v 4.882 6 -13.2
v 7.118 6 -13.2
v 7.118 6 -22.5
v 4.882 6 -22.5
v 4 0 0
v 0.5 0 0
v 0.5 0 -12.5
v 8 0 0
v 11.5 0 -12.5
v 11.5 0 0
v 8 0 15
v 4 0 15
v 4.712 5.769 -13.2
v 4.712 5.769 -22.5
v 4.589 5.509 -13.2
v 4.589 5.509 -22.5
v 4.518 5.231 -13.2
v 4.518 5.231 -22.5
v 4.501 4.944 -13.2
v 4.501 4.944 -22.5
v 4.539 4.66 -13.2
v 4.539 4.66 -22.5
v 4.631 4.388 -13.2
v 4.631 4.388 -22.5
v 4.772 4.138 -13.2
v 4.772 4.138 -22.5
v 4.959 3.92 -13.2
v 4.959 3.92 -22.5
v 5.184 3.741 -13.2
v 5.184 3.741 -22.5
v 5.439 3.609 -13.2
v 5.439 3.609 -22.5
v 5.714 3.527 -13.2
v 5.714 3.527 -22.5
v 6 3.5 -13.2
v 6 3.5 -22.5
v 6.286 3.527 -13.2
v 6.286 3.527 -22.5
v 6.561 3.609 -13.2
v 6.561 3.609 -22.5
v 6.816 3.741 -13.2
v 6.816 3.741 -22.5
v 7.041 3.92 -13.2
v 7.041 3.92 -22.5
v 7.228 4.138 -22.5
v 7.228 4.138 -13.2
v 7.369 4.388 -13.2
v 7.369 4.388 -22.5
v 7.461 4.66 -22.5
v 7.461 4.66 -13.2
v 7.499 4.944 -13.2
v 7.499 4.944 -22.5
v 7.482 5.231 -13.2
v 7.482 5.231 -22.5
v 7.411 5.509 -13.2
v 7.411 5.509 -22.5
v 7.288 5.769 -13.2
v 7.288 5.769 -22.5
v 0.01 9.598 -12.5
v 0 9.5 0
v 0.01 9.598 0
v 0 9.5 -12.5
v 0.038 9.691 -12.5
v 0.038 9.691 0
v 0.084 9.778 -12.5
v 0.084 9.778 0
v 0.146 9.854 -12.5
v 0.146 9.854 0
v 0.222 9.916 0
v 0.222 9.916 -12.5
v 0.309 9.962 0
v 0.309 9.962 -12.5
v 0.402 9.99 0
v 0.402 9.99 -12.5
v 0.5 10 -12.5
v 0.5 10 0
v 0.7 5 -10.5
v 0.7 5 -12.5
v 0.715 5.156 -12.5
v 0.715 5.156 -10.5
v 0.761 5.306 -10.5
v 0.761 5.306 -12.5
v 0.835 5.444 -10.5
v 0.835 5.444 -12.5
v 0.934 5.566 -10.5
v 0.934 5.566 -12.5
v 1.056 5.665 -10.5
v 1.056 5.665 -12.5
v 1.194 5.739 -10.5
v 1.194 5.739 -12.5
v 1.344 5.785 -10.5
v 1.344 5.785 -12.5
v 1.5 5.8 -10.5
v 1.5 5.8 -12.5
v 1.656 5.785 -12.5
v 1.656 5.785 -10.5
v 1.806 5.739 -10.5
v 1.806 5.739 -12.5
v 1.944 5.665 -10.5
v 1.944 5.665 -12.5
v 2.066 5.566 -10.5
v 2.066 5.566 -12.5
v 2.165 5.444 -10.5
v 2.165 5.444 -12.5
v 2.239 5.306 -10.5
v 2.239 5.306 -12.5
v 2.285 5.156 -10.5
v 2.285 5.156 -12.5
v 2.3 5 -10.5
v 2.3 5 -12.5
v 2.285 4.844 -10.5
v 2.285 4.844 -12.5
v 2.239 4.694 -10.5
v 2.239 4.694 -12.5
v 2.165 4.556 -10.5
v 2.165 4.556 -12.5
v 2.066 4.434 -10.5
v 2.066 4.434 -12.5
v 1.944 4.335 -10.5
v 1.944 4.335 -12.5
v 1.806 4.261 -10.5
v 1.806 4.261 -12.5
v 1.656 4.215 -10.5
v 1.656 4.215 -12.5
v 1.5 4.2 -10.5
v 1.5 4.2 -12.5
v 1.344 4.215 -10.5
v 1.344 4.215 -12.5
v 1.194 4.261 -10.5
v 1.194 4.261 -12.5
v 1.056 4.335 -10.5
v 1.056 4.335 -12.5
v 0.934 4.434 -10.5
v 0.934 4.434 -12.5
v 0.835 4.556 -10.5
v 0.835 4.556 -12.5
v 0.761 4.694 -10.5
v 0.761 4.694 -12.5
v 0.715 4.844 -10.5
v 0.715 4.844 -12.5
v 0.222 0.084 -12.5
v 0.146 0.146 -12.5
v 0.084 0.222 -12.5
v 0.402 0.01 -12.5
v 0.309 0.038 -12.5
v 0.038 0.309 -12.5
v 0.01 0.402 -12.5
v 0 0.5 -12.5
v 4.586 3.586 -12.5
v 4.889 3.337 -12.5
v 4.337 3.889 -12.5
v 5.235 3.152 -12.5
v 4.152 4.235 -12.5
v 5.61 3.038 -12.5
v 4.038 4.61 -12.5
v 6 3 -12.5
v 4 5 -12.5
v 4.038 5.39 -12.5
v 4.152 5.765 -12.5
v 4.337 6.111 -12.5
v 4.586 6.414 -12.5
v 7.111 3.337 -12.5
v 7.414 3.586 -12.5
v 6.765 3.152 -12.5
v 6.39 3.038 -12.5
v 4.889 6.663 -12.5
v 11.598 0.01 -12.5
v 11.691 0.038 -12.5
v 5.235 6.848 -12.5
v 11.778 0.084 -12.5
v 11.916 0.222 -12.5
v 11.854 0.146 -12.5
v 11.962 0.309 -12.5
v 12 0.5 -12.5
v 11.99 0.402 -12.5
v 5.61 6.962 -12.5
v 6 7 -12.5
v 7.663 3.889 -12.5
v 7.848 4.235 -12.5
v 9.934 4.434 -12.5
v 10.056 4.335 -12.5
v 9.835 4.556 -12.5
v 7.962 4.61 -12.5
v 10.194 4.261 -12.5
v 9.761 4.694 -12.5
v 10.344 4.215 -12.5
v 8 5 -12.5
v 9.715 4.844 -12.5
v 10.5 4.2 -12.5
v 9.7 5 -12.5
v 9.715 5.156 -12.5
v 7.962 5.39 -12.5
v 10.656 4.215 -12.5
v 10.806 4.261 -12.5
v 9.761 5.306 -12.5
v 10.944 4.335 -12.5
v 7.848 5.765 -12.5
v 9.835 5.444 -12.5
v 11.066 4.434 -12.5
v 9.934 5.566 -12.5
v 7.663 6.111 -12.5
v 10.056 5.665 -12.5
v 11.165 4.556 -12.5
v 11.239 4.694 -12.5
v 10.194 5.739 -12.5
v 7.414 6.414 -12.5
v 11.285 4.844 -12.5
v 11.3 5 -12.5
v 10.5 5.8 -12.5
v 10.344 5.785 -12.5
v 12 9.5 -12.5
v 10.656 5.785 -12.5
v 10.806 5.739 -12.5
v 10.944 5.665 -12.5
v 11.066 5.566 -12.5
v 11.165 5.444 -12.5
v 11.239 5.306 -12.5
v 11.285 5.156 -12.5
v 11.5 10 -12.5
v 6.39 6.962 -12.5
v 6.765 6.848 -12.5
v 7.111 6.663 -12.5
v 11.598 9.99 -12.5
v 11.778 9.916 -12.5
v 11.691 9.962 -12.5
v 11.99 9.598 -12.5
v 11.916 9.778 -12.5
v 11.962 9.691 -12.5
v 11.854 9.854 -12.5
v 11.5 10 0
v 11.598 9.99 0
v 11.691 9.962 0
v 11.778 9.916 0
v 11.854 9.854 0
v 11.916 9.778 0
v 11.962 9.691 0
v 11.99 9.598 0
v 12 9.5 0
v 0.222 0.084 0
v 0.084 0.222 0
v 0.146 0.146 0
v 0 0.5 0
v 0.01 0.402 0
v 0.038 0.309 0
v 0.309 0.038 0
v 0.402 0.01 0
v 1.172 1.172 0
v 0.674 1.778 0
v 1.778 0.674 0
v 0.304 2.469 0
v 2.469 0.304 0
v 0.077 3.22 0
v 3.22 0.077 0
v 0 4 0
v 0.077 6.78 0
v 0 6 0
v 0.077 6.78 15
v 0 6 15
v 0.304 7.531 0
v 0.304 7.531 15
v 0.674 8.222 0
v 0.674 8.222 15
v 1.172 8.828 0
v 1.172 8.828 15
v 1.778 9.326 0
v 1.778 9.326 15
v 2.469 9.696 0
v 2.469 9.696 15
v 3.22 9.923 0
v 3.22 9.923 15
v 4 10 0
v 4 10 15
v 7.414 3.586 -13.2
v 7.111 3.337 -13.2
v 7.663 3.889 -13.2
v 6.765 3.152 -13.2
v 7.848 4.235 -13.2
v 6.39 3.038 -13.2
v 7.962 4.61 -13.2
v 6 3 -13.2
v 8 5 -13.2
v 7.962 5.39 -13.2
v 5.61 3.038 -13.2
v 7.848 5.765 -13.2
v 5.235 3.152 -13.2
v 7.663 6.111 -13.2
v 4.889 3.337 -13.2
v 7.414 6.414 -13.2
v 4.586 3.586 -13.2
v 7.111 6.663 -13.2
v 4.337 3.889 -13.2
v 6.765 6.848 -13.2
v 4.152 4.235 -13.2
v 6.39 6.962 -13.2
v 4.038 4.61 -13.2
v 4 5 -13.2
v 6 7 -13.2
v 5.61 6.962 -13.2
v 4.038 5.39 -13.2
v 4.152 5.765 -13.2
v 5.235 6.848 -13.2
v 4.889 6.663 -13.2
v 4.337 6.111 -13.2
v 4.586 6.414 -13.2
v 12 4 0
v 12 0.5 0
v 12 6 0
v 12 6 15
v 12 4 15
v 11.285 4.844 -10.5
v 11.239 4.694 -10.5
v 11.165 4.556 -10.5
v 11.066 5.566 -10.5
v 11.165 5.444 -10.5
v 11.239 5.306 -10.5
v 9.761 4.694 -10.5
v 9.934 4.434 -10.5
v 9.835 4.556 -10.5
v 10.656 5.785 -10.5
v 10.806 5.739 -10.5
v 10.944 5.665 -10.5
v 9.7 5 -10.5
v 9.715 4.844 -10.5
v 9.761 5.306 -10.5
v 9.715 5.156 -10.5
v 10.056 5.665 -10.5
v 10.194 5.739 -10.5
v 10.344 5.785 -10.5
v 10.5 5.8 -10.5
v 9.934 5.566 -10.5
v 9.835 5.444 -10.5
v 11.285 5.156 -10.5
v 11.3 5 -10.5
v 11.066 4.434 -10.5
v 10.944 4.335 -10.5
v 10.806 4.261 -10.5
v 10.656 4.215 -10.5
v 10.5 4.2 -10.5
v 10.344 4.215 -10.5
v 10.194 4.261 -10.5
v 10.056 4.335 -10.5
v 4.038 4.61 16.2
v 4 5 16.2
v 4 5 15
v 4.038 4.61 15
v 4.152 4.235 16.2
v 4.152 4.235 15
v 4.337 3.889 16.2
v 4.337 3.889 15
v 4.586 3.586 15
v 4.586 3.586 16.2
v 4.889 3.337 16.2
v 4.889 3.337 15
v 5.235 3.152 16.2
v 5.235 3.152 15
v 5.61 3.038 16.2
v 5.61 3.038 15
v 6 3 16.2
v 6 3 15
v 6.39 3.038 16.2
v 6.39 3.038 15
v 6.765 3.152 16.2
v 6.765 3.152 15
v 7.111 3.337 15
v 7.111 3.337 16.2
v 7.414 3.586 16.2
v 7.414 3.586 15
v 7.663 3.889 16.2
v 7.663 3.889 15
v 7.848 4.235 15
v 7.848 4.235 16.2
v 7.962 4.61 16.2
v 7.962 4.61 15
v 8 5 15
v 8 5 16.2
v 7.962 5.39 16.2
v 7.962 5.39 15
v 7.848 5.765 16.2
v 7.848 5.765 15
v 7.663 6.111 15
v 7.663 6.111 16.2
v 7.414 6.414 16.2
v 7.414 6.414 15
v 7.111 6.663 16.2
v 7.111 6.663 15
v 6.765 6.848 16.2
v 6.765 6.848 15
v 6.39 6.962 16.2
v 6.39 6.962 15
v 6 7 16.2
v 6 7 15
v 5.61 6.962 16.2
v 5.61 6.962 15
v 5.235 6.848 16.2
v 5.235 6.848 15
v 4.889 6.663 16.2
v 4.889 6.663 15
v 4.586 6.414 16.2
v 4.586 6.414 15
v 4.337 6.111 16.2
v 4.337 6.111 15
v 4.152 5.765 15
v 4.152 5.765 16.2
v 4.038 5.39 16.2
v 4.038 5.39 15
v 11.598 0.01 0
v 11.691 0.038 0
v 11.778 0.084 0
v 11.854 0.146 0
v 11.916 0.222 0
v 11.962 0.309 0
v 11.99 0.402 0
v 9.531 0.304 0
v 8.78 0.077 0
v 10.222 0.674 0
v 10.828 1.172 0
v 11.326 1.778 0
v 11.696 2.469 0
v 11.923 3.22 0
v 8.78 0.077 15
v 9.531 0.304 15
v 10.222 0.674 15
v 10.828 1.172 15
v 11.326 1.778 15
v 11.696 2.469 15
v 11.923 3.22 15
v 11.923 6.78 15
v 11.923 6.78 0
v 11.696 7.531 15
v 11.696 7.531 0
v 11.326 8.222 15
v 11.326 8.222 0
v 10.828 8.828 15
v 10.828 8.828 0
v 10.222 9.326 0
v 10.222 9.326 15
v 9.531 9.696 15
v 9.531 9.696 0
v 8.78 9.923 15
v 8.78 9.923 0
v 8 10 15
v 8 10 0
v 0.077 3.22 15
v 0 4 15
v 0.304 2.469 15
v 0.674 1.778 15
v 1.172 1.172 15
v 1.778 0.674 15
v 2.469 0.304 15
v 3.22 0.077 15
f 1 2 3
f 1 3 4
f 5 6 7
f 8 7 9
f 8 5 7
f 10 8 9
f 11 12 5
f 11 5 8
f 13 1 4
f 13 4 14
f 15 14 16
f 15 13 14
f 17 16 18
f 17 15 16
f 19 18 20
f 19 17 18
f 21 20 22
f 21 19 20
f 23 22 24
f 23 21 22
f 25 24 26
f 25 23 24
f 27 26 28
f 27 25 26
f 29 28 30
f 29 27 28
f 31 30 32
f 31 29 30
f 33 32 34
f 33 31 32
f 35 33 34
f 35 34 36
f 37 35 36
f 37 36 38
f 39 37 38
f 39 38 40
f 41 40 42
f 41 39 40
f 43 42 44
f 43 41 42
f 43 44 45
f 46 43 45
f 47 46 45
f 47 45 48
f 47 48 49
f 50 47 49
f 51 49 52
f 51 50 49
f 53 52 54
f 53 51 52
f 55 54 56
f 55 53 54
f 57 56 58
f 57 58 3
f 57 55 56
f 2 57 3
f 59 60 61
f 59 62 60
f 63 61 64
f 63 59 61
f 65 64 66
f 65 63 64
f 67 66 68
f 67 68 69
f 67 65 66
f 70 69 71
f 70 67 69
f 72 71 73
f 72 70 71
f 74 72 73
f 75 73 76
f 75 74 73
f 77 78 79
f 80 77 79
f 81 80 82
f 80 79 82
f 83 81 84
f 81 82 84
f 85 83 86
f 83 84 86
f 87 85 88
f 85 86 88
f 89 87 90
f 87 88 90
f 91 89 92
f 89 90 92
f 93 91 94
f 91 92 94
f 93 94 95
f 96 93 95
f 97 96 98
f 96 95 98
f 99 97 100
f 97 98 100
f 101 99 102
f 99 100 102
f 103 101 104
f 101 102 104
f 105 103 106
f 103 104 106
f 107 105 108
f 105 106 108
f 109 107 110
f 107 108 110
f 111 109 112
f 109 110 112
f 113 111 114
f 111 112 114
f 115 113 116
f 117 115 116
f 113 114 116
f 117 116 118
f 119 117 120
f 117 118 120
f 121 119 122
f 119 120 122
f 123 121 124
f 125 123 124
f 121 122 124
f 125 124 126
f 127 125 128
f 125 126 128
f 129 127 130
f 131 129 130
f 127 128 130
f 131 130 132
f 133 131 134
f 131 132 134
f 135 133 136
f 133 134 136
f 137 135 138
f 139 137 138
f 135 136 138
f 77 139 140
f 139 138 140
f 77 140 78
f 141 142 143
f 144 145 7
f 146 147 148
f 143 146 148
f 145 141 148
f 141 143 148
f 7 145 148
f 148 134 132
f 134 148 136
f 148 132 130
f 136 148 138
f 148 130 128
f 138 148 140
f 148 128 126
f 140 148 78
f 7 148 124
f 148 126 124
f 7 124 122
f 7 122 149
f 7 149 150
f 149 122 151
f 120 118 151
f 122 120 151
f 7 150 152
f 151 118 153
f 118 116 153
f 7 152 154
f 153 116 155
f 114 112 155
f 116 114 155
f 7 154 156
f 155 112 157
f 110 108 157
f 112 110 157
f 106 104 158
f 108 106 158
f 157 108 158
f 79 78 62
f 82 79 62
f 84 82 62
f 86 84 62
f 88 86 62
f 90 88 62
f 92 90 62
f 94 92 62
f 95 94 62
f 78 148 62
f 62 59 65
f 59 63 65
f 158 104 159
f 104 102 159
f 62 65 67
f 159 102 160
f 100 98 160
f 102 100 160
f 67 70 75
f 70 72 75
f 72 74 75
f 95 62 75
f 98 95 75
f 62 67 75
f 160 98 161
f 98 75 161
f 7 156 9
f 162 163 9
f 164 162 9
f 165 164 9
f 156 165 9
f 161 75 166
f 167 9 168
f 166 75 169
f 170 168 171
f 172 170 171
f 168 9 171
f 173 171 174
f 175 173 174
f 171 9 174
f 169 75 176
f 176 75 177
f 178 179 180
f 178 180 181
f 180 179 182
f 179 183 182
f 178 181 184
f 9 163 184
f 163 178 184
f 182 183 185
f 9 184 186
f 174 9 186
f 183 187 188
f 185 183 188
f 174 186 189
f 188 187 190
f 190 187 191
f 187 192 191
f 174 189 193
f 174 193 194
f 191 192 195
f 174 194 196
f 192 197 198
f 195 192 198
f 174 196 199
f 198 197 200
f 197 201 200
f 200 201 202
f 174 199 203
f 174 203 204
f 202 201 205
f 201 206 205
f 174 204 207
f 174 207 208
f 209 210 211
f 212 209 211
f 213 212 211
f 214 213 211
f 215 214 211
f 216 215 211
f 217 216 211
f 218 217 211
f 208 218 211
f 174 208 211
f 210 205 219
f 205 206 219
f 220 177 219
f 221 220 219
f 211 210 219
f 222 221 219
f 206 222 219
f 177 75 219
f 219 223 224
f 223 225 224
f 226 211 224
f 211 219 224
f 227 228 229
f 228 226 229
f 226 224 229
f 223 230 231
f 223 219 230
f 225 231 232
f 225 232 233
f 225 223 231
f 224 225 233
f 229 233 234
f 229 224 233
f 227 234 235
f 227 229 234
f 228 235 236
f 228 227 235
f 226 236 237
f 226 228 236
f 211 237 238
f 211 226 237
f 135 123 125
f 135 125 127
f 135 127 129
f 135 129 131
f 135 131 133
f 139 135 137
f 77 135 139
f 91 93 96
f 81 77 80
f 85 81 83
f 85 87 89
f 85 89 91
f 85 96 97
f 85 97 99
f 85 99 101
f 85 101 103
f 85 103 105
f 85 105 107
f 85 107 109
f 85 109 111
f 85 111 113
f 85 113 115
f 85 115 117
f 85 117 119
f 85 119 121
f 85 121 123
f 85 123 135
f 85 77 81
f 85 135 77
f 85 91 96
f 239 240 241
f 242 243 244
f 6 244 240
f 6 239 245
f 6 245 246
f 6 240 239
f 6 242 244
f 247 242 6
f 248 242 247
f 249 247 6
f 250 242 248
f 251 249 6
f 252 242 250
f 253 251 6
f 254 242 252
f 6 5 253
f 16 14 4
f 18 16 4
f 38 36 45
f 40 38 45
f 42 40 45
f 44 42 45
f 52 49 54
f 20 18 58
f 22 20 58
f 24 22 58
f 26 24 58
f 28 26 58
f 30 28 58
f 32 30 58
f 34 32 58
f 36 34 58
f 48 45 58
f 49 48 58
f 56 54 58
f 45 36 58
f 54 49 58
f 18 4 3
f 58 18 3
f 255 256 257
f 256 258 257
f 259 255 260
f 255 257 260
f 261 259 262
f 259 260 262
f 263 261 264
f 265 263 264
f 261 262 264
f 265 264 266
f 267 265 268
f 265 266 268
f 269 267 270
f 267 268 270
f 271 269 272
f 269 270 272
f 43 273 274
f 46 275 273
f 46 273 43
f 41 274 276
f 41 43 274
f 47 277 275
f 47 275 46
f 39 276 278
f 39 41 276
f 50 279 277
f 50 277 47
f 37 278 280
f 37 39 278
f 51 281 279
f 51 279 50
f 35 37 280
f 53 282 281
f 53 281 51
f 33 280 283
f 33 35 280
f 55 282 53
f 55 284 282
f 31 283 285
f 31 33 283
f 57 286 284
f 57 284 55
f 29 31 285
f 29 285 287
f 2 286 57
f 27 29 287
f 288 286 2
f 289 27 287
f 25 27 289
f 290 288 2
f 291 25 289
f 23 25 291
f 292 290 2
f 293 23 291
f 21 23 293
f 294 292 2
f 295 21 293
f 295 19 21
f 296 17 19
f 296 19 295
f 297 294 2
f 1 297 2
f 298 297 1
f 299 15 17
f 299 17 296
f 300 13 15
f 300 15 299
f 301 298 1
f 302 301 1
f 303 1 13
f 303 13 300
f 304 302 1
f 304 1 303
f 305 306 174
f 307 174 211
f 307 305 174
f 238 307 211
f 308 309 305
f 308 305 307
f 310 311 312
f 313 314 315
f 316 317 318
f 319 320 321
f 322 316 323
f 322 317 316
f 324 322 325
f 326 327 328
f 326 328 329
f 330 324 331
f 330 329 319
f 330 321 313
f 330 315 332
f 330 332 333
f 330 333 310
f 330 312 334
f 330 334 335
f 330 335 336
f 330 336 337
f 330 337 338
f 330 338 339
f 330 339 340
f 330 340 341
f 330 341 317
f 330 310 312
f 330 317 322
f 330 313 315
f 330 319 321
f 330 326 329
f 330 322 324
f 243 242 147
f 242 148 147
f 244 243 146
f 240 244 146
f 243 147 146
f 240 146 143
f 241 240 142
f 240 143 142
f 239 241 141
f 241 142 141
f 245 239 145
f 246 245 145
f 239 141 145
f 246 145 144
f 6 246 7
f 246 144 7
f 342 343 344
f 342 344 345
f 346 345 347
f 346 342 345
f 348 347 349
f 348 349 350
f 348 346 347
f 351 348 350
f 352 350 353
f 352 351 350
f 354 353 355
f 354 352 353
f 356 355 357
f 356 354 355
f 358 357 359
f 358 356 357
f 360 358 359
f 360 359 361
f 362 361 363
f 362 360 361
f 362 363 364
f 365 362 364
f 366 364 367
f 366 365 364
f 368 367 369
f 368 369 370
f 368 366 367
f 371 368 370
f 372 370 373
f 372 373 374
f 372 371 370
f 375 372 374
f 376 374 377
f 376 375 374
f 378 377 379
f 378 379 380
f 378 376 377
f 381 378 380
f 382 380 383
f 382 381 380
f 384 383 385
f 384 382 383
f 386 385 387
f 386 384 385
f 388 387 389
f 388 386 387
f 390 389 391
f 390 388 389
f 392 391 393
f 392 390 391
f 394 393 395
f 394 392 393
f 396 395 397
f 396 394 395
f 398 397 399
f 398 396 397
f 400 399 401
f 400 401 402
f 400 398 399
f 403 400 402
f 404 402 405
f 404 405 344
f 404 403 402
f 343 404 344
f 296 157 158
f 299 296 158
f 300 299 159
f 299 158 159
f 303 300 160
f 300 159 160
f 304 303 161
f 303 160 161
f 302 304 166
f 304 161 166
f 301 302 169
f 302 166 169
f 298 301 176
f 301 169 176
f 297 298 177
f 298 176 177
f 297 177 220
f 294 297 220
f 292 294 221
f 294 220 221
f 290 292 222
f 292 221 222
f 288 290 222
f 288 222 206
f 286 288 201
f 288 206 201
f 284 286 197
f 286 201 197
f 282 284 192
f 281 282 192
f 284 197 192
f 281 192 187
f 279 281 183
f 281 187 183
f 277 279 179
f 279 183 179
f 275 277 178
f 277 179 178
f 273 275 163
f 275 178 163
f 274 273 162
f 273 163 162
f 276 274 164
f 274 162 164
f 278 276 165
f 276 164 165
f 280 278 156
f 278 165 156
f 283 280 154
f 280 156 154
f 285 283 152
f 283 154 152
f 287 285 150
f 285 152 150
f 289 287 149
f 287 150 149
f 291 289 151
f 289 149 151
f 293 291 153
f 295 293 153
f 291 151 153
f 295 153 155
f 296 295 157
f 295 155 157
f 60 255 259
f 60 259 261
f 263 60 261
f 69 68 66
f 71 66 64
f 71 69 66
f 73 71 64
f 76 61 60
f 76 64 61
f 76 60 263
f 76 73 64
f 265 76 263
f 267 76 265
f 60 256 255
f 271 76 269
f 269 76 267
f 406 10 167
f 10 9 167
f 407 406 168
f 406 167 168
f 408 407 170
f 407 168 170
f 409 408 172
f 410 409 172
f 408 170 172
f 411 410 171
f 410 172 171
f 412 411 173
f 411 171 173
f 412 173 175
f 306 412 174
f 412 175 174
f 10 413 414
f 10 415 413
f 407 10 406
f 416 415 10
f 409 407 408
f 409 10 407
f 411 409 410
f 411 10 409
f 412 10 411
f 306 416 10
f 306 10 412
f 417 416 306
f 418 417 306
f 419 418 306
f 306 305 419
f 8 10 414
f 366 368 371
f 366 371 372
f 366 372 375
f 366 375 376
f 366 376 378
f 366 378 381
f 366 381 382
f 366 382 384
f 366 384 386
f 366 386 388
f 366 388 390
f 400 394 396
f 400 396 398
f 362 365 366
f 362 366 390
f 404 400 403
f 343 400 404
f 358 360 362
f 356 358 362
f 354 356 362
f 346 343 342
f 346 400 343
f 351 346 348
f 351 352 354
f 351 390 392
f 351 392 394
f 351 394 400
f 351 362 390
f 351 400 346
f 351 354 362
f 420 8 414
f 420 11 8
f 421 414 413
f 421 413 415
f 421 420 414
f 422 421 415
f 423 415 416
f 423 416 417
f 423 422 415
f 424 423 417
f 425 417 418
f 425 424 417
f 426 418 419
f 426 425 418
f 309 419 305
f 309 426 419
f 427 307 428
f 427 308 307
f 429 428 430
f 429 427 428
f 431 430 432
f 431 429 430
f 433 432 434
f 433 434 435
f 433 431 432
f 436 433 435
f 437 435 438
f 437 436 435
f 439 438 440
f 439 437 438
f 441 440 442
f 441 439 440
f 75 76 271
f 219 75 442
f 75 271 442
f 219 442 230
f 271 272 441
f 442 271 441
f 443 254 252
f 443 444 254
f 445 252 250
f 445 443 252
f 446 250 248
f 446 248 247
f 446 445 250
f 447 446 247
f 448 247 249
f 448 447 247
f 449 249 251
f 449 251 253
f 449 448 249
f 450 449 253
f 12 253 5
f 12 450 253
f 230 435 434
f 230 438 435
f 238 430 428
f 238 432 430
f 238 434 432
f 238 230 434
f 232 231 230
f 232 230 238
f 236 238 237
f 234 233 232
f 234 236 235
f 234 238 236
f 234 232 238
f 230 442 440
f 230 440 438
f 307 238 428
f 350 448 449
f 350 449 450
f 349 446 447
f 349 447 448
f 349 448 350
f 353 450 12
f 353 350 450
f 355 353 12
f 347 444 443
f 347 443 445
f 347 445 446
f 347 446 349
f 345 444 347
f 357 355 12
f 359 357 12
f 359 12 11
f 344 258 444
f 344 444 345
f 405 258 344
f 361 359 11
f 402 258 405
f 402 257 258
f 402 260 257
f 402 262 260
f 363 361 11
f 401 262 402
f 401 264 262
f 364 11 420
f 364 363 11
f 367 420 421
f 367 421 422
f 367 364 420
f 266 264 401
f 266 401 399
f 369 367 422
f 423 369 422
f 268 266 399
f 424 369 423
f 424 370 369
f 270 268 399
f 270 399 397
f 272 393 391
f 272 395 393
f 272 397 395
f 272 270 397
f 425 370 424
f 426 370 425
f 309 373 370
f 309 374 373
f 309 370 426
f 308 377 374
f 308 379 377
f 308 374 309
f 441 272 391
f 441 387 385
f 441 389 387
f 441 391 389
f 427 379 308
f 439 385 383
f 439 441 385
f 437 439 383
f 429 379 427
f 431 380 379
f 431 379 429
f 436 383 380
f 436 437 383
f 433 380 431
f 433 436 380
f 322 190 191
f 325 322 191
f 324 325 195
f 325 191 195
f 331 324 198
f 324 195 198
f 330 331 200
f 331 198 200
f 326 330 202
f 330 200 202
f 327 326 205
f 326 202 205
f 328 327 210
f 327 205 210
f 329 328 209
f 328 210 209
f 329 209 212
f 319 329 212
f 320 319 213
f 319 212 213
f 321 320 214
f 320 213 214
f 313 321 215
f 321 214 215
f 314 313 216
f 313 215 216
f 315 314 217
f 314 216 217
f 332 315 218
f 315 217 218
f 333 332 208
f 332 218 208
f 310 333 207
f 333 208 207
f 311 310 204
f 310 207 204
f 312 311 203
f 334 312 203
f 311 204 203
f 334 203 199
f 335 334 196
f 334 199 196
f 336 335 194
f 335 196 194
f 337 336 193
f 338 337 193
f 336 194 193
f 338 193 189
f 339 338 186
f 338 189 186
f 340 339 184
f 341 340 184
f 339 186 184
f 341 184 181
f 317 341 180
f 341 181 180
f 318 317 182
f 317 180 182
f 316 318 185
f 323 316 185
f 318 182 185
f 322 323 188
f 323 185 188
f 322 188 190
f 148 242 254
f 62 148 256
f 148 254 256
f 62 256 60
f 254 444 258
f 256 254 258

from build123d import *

# Parameters (mm, degrees)
SKETCH1_W           = 12
SKETCH1_H           = 10
BOSS_EXTRUDE1_DEPTH = 15
FILLET1_R           = 4
SKETCH3_W           = 12
SKETCH3_H           = 10
BOSS_EXTRUDE2_DEPTH = 12.5
SKETCH4_R           = 2
BOSS_EXTRUDE3_DEPTH = 0.7
BOSS_EXTRUDE4_DEPTH = 9.3
SKETCH7_R           = 0.8
CUT_EXTRUDE1_DEPTH  = 2
BOSS_EXTRUDE5_START = 1.2
SKETCH8_R           = 2
BOSS_EXTRUDE5_DEPTH = 1.2
FILLET2_R           = 0.5


with BuildPart() as part:
    # Sketch1 → Boss-Extrude1 (new body)
    with BuildSketch(Plane.XY):
        with Locations((6, 5)):
            Rectangle(SKETCH1_W, SKETCH1_H)
    extrude(amount=BOSS_EXTRUDE1_DEPTH)

    # Fillet1
    fillet1_edges = [part.edges().sort_by_distance(p)[0] for p in [
        (0, 10, 7.5),
        (12, 10, 7.5),
        (12, 0, 7.5),
        (0, 0, 7.5),
    ]]
    fillet(fillet1_edges, radius=FILLET1_R)

    # Sketch3 → Boss-Extrude2 (add)
    with BuildSketch(Plane.XY):
        with Locations((6, 5)):
            Rectangle(SKETCH3_W, SKETCH3_H)
    extrude(amount=-BOSS_EXTRUDE2_DEPTH)

    # Sketch4 → Boss-Extrude3 (add)
    with BuildSketch(Plane(origin=(0, 0, -12.5), x_dir=(-1, 0, 0), z_dir=(0, 0, -1))):
        with Locations((-6, 5)):
            Circle(SKETCH4_R)
    extrude(amount=BOSS_EXTRUDE3_DEPTH)

    # Sketch5 → Boss-Extrude4 (add)
    with BuildSketch(Plane(origin=(0, 0, -13.2), x_dir=(-1, 0, 0), z_dir=(0, 0, -1))):
        with BuildLine():
            Line((-7.118033989, 6), (-4.881966011, 6))
            ThreePointArc((-4.881966011, 6), (-6, 3.5), (-7.118033989, 6))
        make_face()
    extrude(amount=BOSS_EXTRUDE4_DEPTH)

    # Sketch7 → Cut-Extrude1 (cut)
    with BuildSketch(Plane(origin=(0, 0, -12.5), x_dir=(-1, 0, 0), z_dir=(0, 0, -1))):
        with Locations((-10.5, 5)):
            Circle(SKETCH7_R)
        with Locations((-1.5, 5)):
            Circle(SKETCH7_R)
    extrude(amount=-CUT_EXTRUDE1_DEPTH, mode=Mode.SUBTRACT)

    # Sketch8 → Boss-Extrude5 (add)
    with BuildSketch(Plane.XY.offset(15).offset(BOSS_EXTRUDE5_START)):
        with Locations(Location((6, 5, 0), (0, 0, 180))):
            Circle(SKETCH8_R)
    extrude(amount=-BOSS_EXTRUDE5_DEPTH)

    # Fillet2
    fillet2_edges = [part.edges().sort_by_distance(p)[0] for p in [
        (0, 0, -6.25),
        (0, 10, -6.25),
        (12, 10, -6.25),
        (12, 0, -6.25),
    ]]
    fillet(fillet2_edges, radius=FILLET2_R)


solid = part.part
